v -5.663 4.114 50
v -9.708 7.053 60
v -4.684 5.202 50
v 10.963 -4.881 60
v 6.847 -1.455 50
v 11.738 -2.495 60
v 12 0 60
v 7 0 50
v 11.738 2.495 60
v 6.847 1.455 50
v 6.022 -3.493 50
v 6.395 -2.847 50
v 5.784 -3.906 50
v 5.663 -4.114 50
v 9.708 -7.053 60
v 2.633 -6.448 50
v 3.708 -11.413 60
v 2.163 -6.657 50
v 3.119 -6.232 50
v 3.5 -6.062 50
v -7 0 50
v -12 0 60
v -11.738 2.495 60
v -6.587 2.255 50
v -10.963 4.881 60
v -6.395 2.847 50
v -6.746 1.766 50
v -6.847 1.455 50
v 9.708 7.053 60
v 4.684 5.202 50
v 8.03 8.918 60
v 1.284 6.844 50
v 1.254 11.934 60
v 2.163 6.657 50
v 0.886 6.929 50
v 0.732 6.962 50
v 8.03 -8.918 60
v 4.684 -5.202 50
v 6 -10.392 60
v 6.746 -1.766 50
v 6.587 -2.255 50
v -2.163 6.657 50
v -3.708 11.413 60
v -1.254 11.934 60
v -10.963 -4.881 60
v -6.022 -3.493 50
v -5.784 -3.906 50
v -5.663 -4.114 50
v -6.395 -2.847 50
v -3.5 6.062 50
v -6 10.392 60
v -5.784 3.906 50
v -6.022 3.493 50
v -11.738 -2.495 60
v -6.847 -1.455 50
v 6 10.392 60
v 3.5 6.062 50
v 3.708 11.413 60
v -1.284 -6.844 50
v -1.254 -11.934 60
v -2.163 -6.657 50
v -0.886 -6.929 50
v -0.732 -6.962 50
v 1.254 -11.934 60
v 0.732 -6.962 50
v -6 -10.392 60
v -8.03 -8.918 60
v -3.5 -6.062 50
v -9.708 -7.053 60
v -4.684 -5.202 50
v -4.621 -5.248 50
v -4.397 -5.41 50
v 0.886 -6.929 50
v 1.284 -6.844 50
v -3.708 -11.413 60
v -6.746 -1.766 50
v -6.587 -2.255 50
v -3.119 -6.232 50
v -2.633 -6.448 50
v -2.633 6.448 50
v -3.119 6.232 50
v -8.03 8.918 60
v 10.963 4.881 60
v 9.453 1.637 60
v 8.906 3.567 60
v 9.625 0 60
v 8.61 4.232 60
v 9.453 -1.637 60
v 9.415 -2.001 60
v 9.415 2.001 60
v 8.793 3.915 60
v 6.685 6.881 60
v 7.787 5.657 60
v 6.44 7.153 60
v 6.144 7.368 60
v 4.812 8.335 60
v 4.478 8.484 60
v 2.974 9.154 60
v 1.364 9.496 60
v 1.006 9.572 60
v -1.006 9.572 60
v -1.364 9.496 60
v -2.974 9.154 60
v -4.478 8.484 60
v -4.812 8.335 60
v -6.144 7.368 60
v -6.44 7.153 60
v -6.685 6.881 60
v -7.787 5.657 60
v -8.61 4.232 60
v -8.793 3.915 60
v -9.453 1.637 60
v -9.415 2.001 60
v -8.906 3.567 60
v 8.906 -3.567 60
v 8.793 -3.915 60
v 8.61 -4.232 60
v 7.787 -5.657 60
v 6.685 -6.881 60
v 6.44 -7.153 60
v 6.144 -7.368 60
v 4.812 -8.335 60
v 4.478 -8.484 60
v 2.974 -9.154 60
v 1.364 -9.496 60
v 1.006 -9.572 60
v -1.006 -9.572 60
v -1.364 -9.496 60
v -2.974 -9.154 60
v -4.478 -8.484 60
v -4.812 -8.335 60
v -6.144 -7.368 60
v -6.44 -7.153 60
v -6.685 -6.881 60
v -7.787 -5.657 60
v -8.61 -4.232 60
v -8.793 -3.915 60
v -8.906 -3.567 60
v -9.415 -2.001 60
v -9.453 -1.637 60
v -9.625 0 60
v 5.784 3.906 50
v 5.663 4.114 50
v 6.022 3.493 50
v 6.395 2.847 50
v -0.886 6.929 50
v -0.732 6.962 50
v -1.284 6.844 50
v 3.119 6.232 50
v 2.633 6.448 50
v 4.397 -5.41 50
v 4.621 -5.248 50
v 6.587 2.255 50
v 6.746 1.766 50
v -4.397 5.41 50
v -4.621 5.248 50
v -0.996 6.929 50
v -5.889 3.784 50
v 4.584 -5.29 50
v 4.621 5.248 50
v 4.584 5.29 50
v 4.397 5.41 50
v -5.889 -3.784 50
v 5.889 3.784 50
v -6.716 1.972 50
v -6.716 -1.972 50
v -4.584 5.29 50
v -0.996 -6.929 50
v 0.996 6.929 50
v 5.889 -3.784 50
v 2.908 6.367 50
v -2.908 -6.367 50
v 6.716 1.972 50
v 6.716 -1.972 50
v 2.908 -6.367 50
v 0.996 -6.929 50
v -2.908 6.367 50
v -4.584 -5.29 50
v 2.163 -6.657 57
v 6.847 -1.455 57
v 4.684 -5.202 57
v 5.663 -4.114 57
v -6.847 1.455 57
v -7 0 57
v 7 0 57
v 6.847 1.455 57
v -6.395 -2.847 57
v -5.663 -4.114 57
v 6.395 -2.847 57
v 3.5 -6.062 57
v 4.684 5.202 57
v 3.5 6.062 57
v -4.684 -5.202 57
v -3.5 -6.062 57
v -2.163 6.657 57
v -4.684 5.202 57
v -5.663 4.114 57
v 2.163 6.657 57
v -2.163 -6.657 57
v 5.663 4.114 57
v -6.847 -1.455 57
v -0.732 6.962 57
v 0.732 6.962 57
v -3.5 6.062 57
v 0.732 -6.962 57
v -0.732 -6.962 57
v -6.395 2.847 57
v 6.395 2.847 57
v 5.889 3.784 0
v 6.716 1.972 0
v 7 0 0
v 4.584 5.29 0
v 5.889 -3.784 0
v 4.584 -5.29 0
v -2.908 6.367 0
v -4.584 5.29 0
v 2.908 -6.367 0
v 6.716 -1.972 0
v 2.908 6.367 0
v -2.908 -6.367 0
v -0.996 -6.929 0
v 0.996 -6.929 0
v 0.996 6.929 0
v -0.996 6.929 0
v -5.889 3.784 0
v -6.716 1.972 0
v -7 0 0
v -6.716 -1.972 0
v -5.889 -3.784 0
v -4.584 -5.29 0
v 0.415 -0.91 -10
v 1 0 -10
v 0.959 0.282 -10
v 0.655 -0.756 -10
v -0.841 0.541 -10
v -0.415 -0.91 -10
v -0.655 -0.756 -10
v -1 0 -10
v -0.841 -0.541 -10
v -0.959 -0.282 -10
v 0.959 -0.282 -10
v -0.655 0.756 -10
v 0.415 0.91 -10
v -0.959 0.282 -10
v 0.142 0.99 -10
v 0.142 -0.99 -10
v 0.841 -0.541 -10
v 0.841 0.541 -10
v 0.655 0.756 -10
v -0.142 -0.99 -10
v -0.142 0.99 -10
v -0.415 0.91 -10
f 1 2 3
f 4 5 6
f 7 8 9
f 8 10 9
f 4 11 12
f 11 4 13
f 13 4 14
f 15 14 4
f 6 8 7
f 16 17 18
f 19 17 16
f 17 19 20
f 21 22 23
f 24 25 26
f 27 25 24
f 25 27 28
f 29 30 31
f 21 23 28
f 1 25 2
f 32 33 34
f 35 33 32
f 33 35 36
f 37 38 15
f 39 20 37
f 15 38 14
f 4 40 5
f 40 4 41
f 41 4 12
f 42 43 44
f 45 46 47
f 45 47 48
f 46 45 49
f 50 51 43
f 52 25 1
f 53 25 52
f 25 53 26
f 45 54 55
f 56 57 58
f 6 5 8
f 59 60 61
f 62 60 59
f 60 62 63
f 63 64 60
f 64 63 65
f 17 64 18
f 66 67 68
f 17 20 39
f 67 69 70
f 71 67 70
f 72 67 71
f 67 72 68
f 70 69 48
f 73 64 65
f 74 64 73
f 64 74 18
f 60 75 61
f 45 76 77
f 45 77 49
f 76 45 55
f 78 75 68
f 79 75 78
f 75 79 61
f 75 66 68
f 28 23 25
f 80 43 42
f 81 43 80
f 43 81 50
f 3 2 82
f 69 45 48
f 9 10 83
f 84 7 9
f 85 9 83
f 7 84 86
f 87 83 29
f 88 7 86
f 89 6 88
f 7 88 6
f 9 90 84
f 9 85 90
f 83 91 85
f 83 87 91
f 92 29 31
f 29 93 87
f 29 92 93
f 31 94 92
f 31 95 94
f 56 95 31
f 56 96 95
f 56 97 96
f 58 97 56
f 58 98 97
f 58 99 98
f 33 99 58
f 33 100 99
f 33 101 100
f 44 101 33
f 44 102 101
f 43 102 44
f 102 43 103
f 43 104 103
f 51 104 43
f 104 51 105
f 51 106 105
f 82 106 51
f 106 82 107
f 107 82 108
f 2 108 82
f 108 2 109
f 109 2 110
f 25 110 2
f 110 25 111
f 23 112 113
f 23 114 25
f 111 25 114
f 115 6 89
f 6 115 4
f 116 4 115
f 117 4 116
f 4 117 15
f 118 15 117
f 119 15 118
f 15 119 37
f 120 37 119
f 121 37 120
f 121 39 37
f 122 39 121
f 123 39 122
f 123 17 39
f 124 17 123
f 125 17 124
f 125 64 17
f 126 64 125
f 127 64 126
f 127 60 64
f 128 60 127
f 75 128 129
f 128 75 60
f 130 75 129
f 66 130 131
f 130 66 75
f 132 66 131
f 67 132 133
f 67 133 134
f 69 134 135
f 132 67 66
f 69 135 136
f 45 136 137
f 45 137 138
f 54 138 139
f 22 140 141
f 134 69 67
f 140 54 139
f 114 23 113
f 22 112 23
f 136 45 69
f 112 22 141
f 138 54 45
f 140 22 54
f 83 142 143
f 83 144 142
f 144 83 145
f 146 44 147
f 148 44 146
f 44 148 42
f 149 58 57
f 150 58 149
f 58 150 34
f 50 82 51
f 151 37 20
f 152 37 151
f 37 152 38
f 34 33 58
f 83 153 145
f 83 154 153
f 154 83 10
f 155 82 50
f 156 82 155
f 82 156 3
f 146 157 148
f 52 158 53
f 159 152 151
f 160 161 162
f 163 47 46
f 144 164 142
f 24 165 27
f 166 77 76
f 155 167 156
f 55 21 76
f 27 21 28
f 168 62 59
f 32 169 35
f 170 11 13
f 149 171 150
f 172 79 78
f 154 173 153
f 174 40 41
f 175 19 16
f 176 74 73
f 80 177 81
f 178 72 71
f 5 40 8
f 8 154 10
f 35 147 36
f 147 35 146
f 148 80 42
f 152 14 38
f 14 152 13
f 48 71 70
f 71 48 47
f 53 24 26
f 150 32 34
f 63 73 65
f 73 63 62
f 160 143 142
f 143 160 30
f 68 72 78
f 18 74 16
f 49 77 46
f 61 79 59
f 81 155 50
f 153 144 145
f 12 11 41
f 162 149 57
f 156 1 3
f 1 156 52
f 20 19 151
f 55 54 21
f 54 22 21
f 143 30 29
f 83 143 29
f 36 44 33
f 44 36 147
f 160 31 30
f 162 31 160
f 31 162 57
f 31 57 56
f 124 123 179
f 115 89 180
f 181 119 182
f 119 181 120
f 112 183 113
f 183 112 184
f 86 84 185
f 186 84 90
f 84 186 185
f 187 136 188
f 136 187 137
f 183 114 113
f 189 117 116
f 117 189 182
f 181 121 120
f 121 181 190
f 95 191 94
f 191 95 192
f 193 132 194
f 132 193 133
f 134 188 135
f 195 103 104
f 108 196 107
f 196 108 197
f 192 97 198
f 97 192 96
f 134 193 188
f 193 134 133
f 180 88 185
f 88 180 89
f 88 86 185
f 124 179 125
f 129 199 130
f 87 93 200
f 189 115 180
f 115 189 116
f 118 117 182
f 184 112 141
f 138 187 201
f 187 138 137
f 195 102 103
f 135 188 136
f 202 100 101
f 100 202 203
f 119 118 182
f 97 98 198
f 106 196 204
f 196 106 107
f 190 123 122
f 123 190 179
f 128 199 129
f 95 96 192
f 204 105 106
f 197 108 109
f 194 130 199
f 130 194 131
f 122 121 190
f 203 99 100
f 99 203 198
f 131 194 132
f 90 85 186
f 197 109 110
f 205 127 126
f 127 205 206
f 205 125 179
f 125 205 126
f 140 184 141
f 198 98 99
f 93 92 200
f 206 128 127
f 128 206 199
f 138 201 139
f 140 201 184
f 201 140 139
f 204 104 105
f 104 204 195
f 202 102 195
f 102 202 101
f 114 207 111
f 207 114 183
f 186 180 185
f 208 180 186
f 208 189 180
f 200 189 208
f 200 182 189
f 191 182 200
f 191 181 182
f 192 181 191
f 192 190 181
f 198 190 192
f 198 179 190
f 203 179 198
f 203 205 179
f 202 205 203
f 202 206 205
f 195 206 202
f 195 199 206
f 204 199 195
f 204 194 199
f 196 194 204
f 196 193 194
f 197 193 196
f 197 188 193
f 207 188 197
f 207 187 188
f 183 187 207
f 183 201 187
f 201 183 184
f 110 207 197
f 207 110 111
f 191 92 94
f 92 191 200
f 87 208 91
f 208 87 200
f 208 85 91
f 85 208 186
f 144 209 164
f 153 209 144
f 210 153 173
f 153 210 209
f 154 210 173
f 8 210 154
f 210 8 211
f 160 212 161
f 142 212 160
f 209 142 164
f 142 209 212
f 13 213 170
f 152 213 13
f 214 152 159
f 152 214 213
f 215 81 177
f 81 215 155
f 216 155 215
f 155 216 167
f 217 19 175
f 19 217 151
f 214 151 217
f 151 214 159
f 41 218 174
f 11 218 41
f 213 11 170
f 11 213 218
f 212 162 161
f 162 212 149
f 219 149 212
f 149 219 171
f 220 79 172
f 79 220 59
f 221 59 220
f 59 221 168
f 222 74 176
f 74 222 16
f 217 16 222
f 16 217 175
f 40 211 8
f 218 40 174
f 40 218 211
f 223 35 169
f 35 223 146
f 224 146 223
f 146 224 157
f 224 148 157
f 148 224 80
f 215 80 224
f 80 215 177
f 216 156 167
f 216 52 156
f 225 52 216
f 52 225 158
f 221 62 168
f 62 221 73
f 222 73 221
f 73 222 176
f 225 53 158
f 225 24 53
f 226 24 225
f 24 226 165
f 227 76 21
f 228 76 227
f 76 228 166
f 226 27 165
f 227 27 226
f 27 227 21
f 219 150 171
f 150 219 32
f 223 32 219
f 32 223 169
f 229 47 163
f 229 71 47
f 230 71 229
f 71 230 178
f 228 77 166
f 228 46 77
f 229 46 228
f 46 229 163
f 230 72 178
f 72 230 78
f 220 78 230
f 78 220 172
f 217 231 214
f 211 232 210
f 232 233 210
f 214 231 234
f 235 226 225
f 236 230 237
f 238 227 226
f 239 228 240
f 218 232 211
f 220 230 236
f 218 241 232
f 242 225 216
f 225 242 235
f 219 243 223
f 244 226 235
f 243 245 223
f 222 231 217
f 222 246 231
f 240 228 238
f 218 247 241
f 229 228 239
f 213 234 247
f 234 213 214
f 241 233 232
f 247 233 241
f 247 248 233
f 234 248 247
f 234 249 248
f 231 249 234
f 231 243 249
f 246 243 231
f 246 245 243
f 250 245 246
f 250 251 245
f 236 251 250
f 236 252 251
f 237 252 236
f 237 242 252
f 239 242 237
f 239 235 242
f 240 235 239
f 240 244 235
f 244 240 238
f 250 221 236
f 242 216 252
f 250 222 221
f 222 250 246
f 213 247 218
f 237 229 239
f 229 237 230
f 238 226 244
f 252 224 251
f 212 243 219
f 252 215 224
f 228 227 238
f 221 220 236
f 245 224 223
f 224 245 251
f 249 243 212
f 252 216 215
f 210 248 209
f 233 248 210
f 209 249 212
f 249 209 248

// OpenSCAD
// Customizer Project

// Customizable Length Golf Tee

// Tee Length in mm
    tee_length = 50;
// Tee thickness divided by 2
        // Range 5 to 7 mm 
    tee_thick = 7;

//Resoultion
res=100;
 
module tee_cylinder(){
translate([0,0,tee_length/2])cylinder(tee_length, tee_thick, tee_thick, true, res);
}

module tee_tip() {
translate([0,0,-5]) cylinder(10,1,tee_thick, true, res);
}

module tee_top() {
    difference(){
    translate([0,0,tee_length+5]) cylinder(10,tee_thick,tee_thick+5,true,res);
    translate([0,0,tee_length+9]) cylinder(4,tee_thick,tee_thick+3.5,true,res);
    }
}

module full_tee() {
    union(){ 
        tee_cylinder();
        tee_tip();
        tee_top();
        } }
        
full_tee();
